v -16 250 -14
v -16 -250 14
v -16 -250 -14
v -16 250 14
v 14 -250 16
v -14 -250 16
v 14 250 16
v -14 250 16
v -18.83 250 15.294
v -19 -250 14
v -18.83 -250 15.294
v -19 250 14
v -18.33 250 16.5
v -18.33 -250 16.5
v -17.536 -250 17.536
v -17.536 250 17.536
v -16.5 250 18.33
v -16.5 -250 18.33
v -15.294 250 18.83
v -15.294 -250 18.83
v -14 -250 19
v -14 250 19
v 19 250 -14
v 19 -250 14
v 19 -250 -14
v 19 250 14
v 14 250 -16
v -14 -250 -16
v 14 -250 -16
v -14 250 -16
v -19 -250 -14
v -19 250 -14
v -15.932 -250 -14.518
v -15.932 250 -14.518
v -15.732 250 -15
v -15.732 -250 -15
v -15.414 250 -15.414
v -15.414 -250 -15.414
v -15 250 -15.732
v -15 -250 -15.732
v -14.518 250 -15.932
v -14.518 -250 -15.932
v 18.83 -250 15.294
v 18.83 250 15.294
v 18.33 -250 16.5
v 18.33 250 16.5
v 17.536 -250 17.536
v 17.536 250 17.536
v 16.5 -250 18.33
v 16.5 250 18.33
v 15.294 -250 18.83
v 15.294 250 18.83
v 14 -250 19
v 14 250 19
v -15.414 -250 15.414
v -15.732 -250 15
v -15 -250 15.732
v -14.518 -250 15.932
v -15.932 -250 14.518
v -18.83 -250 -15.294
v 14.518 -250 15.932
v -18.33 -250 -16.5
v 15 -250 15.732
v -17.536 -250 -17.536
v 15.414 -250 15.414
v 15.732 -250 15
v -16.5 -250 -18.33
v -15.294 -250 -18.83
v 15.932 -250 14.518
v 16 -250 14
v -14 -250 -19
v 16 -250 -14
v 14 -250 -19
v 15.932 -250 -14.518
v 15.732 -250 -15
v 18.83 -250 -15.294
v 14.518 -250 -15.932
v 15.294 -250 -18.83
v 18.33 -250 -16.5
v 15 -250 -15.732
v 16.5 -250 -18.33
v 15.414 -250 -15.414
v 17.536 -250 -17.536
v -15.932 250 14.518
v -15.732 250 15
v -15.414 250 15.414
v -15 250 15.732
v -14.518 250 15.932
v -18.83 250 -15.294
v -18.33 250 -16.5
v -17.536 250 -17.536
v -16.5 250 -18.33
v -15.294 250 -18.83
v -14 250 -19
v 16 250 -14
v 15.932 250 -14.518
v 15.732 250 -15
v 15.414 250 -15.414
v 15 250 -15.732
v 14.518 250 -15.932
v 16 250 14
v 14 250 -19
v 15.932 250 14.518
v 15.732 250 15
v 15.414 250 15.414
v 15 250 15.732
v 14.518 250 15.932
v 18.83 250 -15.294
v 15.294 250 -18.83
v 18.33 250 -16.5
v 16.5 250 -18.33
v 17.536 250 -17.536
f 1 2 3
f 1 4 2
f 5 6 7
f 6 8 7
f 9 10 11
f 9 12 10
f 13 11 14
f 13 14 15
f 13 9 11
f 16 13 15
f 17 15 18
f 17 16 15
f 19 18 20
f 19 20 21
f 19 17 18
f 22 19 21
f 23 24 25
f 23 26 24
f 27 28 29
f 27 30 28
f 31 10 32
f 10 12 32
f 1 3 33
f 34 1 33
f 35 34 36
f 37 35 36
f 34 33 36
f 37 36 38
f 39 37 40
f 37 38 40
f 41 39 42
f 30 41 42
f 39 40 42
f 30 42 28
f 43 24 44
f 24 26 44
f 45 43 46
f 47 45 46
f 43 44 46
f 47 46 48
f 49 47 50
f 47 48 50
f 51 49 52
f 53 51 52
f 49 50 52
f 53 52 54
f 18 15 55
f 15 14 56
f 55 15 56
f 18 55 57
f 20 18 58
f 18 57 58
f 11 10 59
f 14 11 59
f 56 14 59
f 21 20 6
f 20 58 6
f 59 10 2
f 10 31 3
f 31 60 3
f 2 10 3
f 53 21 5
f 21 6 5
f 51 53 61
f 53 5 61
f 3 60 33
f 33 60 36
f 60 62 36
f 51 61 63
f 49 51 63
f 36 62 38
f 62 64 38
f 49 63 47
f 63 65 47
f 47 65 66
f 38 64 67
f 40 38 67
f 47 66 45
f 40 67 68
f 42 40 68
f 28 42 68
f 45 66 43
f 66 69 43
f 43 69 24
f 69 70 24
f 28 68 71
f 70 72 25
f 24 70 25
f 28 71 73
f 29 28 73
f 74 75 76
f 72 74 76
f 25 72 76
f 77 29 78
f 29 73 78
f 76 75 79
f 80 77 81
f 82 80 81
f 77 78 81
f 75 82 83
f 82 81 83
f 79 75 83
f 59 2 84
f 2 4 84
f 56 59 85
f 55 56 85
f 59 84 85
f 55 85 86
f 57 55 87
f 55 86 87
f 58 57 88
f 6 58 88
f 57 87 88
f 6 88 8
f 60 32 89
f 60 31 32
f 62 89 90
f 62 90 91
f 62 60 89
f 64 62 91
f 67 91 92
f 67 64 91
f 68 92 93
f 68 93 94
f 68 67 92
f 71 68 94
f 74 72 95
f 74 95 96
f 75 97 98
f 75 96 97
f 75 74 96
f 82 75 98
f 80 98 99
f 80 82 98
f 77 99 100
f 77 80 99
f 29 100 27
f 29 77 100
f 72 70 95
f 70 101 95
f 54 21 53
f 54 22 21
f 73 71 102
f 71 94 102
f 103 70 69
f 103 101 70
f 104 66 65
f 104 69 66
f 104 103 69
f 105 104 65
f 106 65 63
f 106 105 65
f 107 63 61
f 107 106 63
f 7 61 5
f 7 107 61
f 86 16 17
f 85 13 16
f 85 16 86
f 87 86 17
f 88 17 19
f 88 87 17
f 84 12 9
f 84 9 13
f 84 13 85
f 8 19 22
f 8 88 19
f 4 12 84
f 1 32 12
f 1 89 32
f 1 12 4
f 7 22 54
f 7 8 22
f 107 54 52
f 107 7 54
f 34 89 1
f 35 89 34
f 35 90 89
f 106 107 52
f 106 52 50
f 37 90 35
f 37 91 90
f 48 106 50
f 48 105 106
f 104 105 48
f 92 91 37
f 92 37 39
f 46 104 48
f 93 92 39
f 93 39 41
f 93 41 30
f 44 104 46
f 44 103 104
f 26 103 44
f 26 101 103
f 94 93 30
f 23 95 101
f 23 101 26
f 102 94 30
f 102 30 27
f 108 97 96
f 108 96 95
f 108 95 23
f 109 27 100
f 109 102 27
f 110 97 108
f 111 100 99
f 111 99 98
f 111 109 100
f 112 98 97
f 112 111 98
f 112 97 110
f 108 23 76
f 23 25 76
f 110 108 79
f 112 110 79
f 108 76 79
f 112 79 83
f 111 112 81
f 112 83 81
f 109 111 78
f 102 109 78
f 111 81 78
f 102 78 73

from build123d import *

# Parameters (mm, degrees)
SKETCH1_W           = 38
SKETCH1_H           = 38
BOSS_EXTRUDE1_DEPTH = 250
FILLET1_R           = 5
SHELL1_T            = -3


with BuildPart() as part:
    # Sketch1 → Boss-Extrude1 (new, symmetric)
    with BuildSketch(Plane(origin=(0, 0, 0), x_dir=(1, 0, 0), z_dir=(0, 1, 0))):
        Rectangle(SKETCH1_W, SKETCH1_H)
    extrude(amount=BOSS_EXTRUDE1_DEPTH, both=True)

    # Fillet1
    fillet1_edges = [part.edges().sort_by_distance(p)[0] for p in [
        (19, 0, 19),
        (-19, 0, 19),
        (-19, 0, -19),
        (19, 0, -19),
    ]]
    fillet(fillet1_edges, radius=FILLET1_R)

    # Shell1
    shell1_openings = [part.faces().sort_by_distance(p)[0] for p in [
        (0, 250, 0),
        (0, -250, 0),
    ]]
    offset(amount=SHELL1_T, openings=shell1_openings, kind=Kind.INTERSECTION)


solid = part.part
